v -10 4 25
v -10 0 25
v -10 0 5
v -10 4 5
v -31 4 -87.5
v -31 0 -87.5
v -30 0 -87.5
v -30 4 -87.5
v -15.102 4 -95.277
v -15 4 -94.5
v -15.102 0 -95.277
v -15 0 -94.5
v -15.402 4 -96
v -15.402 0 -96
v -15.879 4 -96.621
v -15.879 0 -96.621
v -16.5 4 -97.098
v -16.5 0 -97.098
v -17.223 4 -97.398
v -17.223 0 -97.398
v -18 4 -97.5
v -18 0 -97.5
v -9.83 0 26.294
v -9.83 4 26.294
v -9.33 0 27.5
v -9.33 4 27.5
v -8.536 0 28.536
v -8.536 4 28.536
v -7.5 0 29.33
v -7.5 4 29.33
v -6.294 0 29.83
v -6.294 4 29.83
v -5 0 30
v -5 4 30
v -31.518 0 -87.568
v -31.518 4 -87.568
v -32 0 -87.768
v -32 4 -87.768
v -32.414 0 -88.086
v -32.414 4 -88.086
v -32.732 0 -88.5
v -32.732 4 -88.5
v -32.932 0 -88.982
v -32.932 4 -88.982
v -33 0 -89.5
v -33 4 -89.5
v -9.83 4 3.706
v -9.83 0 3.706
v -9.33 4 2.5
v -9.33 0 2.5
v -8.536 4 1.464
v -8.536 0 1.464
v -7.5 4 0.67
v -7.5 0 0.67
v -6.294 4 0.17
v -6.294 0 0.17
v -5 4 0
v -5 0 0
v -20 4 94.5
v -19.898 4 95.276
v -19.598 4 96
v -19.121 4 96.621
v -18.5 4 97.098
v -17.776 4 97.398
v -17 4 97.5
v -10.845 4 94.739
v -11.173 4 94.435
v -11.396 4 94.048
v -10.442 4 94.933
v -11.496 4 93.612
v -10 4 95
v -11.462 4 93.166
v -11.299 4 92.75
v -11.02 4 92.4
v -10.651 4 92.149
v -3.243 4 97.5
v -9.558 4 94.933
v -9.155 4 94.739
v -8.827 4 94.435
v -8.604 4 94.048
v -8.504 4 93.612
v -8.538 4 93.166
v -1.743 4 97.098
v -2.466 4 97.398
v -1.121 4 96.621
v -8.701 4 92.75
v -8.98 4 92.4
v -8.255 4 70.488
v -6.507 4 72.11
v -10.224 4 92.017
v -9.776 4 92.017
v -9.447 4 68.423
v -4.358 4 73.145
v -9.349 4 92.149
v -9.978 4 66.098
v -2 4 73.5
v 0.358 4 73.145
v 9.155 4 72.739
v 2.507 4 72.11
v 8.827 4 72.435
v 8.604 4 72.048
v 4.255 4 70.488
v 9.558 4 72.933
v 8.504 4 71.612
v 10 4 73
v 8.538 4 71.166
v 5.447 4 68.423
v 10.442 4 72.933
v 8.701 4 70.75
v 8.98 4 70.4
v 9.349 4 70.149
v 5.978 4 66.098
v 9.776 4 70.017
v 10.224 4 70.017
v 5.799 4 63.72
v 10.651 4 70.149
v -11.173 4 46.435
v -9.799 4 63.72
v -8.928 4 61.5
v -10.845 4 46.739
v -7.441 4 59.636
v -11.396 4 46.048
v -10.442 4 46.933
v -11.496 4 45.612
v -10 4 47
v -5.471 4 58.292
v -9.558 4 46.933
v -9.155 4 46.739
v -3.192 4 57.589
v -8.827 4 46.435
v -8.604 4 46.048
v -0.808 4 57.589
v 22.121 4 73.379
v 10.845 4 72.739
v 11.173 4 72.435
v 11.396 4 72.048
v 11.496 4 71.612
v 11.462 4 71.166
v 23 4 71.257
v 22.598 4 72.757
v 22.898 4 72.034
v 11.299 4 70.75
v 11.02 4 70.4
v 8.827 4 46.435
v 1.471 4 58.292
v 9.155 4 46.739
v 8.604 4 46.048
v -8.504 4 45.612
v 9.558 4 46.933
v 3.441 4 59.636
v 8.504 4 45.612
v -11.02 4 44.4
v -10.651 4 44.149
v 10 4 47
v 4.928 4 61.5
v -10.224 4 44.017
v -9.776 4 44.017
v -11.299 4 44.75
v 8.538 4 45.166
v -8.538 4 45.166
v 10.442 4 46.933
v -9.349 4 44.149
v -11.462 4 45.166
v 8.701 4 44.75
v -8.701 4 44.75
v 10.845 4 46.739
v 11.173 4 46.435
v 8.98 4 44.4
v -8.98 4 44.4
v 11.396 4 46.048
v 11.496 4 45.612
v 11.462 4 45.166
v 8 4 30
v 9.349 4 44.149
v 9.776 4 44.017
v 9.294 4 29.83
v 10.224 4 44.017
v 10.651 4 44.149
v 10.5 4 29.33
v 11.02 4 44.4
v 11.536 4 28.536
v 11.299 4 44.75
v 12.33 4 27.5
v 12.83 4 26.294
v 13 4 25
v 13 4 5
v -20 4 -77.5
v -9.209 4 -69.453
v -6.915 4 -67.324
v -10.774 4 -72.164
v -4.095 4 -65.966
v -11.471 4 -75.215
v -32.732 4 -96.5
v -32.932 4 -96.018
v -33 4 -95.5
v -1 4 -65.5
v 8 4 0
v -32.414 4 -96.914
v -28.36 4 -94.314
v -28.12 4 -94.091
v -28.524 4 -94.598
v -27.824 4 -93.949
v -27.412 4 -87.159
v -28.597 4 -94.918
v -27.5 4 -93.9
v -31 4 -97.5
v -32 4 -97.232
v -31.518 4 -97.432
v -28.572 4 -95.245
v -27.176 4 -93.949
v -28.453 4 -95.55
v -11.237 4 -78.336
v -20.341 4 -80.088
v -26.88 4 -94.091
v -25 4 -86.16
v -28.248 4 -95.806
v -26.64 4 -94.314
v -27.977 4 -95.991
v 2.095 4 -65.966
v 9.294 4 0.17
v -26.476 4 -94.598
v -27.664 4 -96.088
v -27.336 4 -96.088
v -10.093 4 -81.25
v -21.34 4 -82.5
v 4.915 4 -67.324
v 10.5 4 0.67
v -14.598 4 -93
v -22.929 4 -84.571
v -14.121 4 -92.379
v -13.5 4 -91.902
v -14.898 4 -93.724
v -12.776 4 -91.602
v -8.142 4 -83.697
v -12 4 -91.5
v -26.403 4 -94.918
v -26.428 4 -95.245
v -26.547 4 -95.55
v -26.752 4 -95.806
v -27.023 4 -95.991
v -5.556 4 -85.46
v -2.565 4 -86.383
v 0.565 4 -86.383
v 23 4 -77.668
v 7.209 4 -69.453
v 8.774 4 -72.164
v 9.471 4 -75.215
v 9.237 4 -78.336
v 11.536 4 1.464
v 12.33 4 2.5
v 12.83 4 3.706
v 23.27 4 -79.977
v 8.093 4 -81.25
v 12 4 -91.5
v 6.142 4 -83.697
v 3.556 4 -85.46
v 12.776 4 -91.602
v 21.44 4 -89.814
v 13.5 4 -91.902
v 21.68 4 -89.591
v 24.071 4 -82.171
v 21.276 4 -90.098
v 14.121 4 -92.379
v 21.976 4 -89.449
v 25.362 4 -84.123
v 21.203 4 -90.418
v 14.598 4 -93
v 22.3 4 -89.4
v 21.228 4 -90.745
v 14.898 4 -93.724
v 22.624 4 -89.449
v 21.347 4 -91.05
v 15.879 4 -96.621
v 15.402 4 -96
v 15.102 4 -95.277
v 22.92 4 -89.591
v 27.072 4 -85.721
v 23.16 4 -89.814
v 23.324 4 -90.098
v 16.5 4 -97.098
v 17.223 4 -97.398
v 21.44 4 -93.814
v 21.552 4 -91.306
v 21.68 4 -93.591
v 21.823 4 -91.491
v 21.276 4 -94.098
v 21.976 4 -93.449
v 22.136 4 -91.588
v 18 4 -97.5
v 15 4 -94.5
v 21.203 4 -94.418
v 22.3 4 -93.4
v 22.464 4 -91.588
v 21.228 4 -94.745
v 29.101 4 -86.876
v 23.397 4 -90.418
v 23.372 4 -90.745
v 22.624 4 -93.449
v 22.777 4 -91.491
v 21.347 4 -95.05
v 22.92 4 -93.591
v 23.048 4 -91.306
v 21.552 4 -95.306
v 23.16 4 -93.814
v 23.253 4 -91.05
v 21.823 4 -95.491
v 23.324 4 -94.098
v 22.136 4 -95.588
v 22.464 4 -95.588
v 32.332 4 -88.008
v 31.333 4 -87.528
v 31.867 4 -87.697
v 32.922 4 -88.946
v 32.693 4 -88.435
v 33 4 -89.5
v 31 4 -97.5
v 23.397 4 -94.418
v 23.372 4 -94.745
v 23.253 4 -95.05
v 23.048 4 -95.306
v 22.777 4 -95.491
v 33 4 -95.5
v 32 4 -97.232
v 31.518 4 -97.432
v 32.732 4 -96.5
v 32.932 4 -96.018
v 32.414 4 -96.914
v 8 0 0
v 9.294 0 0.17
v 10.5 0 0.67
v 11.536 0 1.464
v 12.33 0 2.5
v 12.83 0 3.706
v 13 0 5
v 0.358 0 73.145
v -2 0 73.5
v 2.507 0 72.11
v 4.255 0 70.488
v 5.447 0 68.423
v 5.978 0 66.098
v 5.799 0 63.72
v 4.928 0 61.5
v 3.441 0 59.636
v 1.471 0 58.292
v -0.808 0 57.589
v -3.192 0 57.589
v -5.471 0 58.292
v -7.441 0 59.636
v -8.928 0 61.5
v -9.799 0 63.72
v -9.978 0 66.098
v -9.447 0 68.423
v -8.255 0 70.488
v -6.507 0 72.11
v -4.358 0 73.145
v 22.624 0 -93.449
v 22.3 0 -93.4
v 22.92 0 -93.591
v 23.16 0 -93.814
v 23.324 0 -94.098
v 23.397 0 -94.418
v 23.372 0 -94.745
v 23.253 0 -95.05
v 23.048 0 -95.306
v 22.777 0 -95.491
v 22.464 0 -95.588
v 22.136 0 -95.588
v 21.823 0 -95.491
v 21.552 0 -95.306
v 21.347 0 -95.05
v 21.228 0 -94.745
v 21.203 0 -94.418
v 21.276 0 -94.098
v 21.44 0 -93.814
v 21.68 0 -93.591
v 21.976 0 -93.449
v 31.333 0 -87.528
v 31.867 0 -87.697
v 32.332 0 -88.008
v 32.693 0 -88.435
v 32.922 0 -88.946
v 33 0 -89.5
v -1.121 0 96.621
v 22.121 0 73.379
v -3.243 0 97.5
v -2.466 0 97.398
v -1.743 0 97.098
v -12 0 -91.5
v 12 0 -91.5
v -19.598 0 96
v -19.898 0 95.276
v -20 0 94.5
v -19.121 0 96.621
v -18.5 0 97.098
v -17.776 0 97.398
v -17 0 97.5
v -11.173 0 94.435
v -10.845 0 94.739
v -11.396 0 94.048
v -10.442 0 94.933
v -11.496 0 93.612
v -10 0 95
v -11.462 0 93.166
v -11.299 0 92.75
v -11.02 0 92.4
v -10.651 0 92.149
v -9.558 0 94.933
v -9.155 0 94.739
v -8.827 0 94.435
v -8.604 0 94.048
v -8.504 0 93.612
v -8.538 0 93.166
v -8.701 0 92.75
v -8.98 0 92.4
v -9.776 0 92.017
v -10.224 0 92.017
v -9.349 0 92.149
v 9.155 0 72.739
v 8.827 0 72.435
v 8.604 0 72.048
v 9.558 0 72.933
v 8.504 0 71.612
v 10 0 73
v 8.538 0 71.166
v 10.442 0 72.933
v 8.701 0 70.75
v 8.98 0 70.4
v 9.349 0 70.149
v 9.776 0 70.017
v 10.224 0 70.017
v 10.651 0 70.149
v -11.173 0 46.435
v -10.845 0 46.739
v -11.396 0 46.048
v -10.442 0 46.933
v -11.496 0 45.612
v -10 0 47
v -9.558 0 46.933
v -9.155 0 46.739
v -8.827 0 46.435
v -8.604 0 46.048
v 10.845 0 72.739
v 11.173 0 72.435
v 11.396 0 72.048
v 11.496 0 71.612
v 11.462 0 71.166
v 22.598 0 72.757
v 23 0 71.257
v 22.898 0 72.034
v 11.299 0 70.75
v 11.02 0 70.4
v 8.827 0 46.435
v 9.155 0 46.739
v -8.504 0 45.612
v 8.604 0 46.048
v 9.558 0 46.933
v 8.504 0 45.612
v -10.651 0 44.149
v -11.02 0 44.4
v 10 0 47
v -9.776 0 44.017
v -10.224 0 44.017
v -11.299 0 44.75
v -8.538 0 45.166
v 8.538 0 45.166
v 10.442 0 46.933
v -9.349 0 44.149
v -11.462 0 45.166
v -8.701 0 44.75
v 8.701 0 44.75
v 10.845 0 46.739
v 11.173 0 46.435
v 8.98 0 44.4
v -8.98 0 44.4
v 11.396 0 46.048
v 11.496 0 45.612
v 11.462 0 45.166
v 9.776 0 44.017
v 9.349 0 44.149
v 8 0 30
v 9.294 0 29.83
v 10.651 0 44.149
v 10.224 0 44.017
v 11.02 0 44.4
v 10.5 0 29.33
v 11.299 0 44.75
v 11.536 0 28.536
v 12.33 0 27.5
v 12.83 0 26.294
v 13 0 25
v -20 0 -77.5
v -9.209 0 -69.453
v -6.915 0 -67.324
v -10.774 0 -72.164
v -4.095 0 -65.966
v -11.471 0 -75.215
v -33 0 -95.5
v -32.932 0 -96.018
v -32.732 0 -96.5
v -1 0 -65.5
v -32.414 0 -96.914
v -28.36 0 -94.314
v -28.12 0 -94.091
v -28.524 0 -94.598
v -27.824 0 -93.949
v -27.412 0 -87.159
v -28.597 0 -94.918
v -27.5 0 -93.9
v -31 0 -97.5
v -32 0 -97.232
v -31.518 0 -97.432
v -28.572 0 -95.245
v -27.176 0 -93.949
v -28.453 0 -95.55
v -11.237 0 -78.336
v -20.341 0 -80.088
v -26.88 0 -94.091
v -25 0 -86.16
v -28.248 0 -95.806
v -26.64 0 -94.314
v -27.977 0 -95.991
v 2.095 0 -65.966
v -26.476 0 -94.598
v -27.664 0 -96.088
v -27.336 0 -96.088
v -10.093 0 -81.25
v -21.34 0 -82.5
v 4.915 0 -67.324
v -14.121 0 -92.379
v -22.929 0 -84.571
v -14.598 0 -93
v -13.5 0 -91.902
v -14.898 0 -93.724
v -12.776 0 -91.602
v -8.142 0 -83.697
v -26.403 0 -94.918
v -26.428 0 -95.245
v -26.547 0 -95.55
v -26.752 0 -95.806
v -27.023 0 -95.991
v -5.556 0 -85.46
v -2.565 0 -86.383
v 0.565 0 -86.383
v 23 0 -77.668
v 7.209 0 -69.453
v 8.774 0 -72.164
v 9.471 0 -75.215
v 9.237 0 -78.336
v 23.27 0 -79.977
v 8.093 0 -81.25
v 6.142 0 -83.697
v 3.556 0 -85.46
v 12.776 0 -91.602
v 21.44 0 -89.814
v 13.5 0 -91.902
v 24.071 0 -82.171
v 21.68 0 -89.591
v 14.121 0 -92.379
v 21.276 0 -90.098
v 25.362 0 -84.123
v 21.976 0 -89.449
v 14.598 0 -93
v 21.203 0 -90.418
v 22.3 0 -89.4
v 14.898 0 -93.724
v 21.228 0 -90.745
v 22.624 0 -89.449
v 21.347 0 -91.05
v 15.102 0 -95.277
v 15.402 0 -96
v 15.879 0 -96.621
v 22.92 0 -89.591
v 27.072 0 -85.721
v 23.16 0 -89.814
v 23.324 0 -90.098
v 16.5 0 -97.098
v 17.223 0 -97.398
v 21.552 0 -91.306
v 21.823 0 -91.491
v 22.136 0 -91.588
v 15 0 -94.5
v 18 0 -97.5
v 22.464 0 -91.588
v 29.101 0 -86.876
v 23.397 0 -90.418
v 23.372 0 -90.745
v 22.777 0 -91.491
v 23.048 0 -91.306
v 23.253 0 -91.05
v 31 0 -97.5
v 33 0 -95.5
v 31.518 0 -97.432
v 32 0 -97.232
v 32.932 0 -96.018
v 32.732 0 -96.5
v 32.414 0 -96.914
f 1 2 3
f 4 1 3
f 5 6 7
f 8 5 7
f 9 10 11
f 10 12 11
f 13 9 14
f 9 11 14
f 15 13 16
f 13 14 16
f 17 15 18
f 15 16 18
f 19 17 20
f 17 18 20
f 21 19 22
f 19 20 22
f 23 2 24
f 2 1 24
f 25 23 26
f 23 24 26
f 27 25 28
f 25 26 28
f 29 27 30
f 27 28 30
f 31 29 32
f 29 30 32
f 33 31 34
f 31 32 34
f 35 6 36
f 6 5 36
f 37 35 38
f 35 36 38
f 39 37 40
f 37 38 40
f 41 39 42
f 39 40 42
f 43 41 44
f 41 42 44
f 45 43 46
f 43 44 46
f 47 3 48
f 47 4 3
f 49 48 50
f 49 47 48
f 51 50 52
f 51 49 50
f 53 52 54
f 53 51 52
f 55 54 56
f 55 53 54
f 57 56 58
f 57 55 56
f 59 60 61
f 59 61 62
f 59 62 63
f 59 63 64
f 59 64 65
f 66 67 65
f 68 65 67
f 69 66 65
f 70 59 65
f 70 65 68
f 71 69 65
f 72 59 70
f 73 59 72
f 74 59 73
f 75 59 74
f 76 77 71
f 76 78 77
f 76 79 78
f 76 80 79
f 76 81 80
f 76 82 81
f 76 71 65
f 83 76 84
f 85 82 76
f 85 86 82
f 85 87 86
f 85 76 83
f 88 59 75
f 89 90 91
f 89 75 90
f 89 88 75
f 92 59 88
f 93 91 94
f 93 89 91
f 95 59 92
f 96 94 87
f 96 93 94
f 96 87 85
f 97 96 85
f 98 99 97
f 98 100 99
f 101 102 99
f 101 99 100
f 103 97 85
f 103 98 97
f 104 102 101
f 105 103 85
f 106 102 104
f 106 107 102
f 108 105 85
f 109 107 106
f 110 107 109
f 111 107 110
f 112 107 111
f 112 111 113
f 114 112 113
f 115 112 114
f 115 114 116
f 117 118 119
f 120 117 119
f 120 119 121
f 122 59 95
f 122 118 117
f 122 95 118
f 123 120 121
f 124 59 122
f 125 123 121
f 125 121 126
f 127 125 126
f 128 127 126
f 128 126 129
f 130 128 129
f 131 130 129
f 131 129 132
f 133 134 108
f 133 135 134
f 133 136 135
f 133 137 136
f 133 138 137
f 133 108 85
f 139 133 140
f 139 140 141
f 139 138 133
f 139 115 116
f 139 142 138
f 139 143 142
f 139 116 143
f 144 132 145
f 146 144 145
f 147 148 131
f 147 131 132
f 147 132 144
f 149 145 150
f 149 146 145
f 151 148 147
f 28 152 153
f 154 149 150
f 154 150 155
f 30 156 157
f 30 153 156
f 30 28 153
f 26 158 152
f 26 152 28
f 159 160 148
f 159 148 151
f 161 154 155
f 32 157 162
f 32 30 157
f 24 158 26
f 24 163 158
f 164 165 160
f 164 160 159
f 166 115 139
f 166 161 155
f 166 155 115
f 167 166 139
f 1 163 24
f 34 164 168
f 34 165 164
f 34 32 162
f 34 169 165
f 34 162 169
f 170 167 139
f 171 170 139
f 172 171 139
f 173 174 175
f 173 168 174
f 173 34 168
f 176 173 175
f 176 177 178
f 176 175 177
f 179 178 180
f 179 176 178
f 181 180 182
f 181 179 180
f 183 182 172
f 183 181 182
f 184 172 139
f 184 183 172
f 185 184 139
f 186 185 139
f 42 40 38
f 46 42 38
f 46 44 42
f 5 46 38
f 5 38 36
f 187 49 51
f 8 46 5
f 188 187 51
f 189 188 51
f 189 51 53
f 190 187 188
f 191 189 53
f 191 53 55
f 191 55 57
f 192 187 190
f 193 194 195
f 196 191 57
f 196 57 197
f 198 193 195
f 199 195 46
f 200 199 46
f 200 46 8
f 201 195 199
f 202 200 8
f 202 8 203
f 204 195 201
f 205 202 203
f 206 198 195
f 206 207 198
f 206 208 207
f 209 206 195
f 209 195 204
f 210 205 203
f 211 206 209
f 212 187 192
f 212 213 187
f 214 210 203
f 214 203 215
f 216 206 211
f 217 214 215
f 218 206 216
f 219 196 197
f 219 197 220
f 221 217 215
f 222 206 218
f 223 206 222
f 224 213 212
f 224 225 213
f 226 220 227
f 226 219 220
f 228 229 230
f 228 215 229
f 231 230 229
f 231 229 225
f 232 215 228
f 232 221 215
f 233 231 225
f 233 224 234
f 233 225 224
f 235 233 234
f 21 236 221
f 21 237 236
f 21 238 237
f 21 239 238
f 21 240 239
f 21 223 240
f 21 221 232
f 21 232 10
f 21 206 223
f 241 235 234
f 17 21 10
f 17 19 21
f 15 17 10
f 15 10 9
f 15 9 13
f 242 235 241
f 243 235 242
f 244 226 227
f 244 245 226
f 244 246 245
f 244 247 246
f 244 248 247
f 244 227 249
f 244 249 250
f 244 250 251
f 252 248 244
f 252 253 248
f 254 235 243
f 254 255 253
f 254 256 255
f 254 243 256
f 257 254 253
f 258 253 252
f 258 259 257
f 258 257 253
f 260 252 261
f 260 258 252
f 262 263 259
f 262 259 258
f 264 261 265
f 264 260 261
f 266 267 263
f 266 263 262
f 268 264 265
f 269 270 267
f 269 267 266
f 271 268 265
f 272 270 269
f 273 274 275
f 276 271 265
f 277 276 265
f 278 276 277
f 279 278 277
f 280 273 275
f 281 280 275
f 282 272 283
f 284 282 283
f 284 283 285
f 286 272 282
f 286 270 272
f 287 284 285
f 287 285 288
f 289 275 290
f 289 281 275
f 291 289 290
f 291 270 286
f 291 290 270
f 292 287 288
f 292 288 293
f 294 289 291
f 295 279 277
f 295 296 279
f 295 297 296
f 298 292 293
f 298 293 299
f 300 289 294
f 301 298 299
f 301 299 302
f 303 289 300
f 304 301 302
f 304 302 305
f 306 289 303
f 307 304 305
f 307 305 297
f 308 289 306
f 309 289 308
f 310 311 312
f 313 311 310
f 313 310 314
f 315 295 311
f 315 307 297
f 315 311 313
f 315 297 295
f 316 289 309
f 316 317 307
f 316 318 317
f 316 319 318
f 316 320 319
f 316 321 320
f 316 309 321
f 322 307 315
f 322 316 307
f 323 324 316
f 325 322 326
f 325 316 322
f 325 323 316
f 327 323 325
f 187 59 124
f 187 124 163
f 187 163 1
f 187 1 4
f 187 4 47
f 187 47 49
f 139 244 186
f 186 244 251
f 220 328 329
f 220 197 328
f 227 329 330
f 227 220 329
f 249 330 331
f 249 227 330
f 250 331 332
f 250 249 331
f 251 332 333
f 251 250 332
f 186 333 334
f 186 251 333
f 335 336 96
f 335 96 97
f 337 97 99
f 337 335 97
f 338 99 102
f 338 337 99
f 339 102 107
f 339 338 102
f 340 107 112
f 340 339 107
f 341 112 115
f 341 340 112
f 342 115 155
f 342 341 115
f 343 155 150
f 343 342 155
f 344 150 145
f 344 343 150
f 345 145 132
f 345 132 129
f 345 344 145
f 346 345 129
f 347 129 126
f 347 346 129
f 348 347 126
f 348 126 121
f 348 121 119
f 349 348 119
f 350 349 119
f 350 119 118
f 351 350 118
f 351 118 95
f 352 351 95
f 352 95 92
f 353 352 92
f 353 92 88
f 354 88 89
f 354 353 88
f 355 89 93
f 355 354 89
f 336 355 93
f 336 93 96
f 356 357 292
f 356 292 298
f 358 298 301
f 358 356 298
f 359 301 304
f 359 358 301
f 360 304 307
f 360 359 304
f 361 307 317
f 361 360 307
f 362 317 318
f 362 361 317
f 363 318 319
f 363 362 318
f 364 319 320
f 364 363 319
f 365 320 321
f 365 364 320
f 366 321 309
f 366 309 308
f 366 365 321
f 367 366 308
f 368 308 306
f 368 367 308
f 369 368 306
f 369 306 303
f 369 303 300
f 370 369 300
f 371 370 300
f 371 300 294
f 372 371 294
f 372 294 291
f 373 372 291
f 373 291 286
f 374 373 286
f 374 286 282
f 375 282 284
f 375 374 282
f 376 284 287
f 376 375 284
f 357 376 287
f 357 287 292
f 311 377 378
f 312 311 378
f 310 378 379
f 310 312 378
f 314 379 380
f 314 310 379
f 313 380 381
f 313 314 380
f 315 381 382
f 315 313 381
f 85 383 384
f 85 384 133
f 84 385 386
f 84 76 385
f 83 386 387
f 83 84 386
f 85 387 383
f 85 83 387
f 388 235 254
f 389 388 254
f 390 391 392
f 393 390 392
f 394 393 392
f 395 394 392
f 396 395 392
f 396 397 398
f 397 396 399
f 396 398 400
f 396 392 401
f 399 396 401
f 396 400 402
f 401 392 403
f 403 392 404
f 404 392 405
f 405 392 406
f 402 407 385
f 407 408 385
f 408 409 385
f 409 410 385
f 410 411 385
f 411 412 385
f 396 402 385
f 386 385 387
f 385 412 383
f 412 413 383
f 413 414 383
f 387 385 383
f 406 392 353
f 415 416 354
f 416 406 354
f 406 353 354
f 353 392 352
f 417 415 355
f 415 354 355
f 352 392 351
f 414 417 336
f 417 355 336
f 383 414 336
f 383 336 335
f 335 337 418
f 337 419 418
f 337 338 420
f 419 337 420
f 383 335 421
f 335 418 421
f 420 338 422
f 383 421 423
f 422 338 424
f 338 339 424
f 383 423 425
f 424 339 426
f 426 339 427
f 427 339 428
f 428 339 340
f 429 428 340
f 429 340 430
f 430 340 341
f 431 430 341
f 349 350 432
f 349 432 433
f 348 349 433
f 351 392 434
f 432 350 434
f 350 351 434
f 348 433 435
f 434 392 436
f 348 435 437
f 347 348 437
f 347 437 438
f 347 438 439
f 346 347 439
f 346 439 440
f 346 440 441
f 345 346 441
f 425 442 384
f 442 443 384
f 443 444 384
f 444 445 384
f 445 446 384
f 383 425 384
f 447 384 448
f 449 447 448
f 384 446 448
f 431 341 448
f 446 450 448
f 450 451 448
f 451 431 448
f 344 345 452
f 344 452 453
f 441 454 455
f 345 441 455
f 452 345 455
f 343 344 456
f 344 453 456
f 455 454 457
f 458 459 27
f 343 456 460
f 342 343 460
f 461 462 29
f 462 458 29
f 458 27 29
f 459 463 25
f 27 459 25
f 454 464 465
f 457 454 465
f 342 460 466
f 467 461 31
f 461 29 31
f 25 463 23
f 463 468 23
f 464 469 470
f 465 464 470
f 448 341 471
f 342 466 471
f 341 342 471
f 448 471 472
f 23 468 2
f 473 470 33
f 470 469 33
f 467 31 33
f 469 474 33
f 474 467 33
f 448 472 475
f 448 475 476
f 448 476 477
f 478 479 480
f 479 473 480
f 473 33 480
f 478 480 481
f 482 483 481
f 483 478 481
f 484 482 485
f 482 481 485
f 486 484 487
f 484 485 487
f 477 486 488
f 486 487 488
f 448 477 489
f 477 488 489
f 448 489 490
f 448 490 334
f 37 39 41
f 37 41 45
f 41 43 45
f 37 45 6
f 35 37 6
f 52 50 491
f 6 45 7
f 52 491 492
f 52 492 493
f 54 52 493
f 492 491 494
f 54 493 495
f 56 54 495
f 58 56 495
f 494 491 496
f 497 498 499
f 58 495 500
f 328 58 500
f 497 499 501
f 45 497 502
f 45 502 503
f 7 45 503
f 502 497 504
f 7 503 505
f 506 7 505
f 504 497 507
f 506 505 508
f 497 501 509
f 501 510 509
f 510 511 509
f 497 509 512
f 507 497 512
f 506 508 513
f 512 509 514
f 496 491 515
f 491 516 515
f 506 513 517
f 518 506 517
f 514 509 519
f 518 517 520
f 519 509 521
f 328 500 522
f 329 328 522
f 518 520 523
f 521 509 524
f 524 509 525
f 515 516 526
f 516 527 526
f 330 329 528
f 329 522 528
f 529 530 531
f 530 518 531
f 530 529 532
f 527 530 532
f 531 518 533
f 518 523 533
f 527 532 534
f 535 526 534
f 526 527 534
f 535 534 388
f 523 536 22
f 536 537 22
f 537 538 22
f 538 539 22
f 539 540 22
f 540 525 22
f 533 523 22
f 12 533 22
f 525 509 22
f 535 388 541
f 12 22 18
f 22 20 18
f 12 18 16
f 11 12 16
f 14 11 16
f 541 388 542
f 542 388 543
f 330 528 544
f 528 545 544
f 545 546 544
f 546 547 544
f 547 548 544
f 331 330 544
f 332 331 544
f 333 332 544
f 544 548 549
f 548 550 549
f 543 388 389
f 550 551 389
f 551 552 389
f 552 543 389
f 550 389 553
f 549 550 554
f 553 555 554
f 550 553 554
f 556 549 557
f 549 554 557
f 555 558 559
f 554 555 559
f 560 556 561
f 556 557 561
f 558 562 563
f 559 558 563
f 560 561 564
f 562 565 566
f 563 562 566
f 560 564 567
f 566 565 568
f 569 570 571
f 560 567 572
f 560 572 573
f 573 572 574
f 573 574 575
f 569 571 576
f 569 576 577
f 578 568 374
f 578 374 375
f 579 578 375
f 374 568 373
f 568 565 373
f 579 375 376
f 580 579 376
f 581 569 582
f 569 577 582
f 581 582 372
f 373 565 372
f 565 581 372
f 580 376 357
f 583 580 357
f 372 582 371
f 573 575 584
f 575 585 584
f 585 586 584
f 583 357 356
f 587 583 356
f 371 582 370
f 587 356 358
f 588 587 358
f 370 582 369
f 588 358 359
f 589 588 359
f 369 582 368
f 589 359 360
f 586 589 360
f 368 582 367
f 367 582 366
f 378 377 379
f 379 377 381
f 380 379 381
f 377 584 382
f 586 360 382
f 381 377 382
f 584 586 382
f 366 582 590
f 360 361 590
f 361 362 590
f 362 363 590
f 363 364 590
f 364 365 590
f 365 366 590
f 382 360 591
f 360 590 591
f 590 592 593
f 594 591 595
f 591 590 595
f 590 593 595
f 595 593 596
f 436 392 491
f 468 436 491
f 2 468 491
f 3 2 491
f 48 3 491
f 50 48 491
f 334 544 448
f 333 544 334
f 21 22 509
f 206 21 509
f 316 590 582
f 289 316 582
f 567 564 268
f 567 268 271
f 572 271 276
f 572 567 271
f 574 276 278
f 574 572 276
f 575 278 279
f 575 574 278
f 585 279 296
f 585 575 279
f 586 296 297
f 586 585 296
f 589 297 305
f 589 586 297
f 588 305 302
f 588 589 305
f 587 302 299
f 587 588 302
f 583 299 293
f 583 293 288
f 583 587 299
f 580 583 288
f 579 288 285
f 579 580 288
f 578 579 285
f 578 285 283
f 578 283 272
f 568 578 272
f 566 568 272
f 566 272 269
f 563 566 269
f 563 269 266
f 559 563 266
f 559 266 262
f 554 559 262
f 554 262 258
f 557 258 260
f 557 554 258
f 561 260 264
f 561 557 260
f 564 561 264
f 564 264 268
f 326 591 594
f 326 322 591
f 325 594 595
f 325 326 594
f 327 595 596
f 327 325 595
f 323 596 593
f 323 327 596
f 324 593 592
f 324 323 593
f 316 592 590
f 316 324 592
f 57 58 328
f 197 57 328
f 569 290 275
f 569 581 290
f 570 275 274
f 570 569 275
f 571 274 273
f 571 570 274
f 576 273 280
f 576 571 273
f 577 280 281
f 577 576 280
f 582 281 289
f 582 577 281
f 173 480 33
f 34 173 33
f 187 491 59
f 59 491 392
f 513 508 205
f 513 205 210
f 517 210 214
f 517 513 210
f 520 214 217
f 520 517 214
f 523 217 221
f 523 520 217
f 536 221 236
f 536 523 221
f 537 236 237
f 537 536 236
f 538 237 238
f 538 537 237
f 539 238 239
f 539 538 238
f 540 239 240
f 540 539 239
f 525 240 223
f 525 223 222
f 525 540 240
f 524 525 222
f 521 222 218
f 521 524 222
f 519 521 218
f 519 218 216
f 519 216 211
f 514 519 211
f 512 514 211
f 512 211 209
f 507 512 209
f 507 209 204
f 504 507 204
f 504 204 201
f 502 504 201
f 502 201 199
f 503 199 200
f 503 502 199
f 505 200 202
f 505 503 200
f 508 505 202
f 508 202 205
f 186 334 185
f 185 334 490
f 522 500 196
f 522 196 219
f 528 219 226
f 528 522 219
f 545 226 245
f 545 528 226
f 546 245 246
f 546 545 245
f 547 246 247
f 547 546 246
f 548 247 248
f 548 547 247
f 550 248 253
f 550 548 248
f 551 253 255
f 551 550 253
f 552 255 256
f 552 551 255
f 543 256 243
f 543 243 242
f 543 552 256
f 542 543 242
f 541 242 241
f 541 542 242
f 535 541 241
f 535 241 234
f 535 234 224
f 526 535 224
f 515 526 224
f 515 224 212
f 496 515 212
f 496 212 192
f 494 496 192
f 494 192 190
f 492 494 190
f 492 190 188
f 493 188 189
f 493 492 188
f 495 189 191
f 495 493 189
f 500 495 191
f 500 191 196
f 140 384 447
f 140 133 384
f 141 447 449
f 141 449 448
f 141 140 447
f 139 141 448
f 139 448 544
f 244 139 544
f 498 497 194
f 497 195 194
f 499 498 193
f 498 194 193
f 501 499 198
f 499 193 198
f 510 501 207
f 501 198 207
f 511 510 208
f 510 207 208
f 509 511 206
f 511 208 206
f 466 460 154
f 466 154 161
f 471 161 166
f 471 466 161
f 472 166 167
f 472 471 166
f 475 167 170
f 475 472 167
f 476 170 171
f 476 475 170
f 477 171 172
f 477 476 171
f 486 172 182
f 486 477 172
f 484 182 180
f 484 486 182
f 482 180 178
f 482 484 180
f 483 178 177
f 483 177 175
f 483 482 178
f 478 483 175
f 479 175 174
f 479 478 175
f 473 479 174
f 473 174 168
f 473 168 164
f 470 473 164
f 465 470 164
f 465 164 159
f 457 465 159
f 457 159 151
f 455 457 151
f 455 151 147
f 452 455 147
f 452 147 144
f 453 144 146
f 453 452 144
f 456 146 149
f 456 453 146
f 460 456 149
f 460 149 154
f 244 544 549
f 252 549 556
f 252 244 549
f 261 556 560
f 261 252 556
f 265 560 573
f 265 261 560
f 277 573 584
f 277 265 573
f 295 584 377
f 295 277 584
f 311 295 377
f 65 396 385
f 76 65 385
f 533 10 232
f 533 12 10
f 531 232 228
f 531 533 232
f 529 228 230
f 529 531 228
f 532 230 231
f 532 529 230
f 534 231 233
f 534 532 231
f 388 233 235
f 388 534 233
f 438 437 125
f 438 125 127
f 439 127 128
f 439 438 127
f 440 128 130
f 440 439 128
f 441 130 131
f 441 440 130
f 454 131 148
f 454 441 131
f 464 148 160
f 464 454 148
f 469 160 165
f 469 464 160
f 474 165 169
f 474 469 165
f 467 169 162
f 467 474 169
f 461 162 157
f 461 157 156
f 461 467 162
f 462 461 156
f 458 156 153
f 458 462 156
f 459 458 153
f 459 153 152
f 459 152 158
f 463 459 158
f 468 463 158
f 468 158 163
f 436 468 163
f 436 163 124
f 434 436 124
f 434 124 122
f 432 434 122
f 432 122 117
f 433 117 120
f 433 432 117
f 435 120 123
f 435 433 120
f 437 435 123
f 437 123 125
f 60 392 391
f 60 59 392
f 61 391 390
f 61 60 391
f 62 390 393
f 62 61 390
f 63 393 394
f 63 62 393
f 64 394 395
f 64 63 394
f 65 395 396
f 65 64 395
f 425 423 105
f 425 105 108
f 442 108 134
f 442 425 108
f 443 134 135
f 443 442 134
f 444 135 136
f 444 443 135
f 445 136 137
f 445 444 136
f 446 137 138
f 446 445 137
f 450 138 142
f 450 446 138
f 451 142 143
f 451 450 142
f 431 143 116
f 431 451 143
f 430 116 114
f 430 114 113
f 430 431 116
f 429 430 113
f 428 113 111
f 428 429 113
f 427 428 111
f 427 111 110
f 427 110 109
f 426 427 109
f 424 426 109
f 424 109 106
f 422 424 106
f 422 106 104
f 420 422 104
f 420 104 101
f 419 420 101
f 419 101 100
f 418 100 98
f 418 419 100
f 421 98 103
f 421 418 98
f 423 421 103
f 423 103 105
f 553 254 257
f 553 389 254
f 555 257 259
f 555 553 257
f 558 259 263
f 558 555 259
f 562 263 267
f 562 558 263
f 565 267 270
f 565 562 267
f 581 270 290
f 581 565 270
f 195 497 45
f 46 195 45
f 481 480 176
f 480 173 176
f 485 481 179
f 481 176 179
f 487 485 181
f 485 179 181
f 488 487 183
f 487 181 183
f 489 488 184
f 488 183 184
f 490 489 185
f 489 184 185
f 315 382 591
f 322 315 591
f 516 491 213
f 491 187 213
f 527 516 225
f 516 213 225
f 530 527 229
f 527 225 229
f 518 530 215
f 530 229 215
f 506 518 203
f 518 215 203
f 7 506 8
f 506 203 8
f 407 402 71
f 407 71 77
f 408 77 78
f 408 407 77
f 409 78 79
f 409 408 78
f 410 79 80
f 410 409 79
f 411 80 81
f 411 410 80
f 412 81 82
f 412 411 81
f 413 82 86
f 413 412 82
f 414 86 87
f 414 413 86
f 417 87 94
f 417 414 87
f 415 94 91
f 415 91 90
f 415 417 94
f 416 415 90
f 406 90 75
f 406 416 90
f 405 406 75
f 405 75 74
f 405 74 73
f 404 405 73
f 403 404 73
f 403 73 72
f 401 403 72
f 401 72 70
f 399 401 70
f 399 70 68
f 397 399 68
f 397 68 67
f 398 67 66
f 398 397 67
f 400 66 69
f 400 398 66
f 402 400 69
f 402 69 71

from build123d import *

# Parameters (mm, degrees)
SKETCH_1_R          = 1.5
SKETCH_1_R_2        = 8
SKETCH_1_R_3        = 1.1
SKETCH_1_R_4        = 10.5
EXTRUDE_1_DEPTH     = 4
SKETCH_3_W          = 30
SKETCH_3_H          = 6
CUT_EXTRUDE_1_DEPTH = 5
FILLET_4_R          = 3
CHAMFER_1_SIZE      = 25
FILLET_8_R          = 5
FILLET_12_R         = 2
FILLET_13_R         = 3
FILLET_14_R         = 10


with BuildPart() as part:
    # 草图1 → 凸台-拉伸1 (new body)
    with BuildSketch(Plane(origin=(0, 0, 0), x_dir=(1, 0, 0), z_dir=(0, 1, 0))):
        Polygon((-20, 17.5), (-20, -97.5), (23, -97.5), (23, 17.5), (23, 87.5), (33, 87.5), (33, 97.5), (-33, 97.5), (-33, 87.5), (-20, 87.5), align=None)
        with Locations(Location((-10, -93.5, 0), (0, 0, 270))):
            Circle(SKETCH_1_R, mode=Mode.SUBTRACT)
        with Locations(Location((-2, -65.5, 0), (0, 0, 270))):
            Circle(SKETCH_1_R_2, mode=Mode.SUBTRACT)
        with Locations(Location((-10, -45.5, 0), (0, 0, 270))):
            Circle(SKETCH_1_R, mode=Mode.SUBTRACT)
        with Locations(Location((10, -71.5, 0), (0, 0, 270))):
            Circle(SKETCH_1_R, mode=Mode.SUBTRACT)
        with Locations(Location((10, -45.5, 0), (0, 0, 270))):
            Circle(SKETCH_1_R, mode=Mode.SUBTRACT)
        Polygon((-10, 0), (10, 0), (13, 0), (13, -30), (10, -30), (-10, -30), align=None, mode=Mode.SUBTRACT)
        with Locations(Location((-27.5, 95, 0), (0, 0, 270))):
            Circle(SKETCH_1_R_3, mode=Mode.SUBTRACT)
        with Locations(Location((-1, 76, 0), (0, 0, 270))):
            Circle(SKETCH_1_R_4, mode=Mode.SUBTRACT)
        with Locations(Location((22.3, 90.5, 0), (0, 0, 270))):
            Circle(SKETCH_1_R_3, mode=Mode.SUBTRACT)
        with Locations(Location((22.3, 94.5, 0), (0, 0, 270))):
            Circle(SKETCH_1_R_3, mode=Mode.SUBTRACT)
    extrude(amount=EXTRUDE_1_DEPTH)

    # 草图3 → 切除-拉伸1 (cut)
    with BuildSketch(Plane(origin=(0, 4, 0), x_dir=(1, 0, 0), z_dir=(0, 1, 0))):
        with Locations((0, 94.5)):
            Rectangle(SKETCH_3_W, SKETCH_3_H)
    extrude(amount=-CUT_EXTRUDE_1_DEPTH, mode=Mode.SUBTRACT)

    # 圆角4
    fillet_4_edges = [part.edges().sort_by_distance(p)[0] for p in [
        (15, 2, -91.5),
        (-15, 2, -91.5),
    ]]
    fillet(fillet_4_edges, radius=FILLET_4_R)
    fillet_4_2_edges = [part.edges().sort_by_distance(p)[0] for p in [
        (15, 2, -97.5),
        (-15, 2, -97.5),
    ]]
    fillet(fillet_4_2_edges, radius=FILLET_4_R - 0.0001)  # a hair under: the kernel refuses the full size

    # 倒角1
    chamfer_1_edges = [part.edges().sort_by_distance(p)[0] for p in [
        (23, 2, 97.5),
    ]]
    chamfer(chamfer_1_edges, length=CHAMFER_1_SIZE)

    # 圆角8
    fillet_8_edges = [part.edges().sort_by_distance(p)[0] for p in [
        (13, 2, 0),
        (-10, 2, 0),
        (-10, 2, 30),
        (13, 2, 30),
    ]]
    fillet(fillet_8_edges, radius=FILLET_8_R)

    # 圆角12
    fillet_12_edges = [part.edges().sort_by_distance(p)[0] for p in [
        (-33, 2, -87.5),
        (-33, 2, -97.5),
        (33, 2, -97.5),
        (33, 2, -87.5),
    ]]
    fillet(fillet_12_edges, radius=FILLET_12_R)

    # 圆角13
    fillet_13_edges = [part.edges().sort_by_distance(p)[0] for p in [
        (23, 2, 72.5),
        (-2, 2, 97.5),
        (-20, 2, 97.5),
    ]]
    fillet(fillet_13_edges, radius=FILLET_13_R)

    # 圆角14
    fillet_14_edges = [part.edges().sort_by_distance(p)[0] for p in [
        (23, 2, -87.5),
        (-20, 2, -87.5),
    ]]
    fillet(fillet_14_edges, radius=FILLET_14_R)


solid = part.part
